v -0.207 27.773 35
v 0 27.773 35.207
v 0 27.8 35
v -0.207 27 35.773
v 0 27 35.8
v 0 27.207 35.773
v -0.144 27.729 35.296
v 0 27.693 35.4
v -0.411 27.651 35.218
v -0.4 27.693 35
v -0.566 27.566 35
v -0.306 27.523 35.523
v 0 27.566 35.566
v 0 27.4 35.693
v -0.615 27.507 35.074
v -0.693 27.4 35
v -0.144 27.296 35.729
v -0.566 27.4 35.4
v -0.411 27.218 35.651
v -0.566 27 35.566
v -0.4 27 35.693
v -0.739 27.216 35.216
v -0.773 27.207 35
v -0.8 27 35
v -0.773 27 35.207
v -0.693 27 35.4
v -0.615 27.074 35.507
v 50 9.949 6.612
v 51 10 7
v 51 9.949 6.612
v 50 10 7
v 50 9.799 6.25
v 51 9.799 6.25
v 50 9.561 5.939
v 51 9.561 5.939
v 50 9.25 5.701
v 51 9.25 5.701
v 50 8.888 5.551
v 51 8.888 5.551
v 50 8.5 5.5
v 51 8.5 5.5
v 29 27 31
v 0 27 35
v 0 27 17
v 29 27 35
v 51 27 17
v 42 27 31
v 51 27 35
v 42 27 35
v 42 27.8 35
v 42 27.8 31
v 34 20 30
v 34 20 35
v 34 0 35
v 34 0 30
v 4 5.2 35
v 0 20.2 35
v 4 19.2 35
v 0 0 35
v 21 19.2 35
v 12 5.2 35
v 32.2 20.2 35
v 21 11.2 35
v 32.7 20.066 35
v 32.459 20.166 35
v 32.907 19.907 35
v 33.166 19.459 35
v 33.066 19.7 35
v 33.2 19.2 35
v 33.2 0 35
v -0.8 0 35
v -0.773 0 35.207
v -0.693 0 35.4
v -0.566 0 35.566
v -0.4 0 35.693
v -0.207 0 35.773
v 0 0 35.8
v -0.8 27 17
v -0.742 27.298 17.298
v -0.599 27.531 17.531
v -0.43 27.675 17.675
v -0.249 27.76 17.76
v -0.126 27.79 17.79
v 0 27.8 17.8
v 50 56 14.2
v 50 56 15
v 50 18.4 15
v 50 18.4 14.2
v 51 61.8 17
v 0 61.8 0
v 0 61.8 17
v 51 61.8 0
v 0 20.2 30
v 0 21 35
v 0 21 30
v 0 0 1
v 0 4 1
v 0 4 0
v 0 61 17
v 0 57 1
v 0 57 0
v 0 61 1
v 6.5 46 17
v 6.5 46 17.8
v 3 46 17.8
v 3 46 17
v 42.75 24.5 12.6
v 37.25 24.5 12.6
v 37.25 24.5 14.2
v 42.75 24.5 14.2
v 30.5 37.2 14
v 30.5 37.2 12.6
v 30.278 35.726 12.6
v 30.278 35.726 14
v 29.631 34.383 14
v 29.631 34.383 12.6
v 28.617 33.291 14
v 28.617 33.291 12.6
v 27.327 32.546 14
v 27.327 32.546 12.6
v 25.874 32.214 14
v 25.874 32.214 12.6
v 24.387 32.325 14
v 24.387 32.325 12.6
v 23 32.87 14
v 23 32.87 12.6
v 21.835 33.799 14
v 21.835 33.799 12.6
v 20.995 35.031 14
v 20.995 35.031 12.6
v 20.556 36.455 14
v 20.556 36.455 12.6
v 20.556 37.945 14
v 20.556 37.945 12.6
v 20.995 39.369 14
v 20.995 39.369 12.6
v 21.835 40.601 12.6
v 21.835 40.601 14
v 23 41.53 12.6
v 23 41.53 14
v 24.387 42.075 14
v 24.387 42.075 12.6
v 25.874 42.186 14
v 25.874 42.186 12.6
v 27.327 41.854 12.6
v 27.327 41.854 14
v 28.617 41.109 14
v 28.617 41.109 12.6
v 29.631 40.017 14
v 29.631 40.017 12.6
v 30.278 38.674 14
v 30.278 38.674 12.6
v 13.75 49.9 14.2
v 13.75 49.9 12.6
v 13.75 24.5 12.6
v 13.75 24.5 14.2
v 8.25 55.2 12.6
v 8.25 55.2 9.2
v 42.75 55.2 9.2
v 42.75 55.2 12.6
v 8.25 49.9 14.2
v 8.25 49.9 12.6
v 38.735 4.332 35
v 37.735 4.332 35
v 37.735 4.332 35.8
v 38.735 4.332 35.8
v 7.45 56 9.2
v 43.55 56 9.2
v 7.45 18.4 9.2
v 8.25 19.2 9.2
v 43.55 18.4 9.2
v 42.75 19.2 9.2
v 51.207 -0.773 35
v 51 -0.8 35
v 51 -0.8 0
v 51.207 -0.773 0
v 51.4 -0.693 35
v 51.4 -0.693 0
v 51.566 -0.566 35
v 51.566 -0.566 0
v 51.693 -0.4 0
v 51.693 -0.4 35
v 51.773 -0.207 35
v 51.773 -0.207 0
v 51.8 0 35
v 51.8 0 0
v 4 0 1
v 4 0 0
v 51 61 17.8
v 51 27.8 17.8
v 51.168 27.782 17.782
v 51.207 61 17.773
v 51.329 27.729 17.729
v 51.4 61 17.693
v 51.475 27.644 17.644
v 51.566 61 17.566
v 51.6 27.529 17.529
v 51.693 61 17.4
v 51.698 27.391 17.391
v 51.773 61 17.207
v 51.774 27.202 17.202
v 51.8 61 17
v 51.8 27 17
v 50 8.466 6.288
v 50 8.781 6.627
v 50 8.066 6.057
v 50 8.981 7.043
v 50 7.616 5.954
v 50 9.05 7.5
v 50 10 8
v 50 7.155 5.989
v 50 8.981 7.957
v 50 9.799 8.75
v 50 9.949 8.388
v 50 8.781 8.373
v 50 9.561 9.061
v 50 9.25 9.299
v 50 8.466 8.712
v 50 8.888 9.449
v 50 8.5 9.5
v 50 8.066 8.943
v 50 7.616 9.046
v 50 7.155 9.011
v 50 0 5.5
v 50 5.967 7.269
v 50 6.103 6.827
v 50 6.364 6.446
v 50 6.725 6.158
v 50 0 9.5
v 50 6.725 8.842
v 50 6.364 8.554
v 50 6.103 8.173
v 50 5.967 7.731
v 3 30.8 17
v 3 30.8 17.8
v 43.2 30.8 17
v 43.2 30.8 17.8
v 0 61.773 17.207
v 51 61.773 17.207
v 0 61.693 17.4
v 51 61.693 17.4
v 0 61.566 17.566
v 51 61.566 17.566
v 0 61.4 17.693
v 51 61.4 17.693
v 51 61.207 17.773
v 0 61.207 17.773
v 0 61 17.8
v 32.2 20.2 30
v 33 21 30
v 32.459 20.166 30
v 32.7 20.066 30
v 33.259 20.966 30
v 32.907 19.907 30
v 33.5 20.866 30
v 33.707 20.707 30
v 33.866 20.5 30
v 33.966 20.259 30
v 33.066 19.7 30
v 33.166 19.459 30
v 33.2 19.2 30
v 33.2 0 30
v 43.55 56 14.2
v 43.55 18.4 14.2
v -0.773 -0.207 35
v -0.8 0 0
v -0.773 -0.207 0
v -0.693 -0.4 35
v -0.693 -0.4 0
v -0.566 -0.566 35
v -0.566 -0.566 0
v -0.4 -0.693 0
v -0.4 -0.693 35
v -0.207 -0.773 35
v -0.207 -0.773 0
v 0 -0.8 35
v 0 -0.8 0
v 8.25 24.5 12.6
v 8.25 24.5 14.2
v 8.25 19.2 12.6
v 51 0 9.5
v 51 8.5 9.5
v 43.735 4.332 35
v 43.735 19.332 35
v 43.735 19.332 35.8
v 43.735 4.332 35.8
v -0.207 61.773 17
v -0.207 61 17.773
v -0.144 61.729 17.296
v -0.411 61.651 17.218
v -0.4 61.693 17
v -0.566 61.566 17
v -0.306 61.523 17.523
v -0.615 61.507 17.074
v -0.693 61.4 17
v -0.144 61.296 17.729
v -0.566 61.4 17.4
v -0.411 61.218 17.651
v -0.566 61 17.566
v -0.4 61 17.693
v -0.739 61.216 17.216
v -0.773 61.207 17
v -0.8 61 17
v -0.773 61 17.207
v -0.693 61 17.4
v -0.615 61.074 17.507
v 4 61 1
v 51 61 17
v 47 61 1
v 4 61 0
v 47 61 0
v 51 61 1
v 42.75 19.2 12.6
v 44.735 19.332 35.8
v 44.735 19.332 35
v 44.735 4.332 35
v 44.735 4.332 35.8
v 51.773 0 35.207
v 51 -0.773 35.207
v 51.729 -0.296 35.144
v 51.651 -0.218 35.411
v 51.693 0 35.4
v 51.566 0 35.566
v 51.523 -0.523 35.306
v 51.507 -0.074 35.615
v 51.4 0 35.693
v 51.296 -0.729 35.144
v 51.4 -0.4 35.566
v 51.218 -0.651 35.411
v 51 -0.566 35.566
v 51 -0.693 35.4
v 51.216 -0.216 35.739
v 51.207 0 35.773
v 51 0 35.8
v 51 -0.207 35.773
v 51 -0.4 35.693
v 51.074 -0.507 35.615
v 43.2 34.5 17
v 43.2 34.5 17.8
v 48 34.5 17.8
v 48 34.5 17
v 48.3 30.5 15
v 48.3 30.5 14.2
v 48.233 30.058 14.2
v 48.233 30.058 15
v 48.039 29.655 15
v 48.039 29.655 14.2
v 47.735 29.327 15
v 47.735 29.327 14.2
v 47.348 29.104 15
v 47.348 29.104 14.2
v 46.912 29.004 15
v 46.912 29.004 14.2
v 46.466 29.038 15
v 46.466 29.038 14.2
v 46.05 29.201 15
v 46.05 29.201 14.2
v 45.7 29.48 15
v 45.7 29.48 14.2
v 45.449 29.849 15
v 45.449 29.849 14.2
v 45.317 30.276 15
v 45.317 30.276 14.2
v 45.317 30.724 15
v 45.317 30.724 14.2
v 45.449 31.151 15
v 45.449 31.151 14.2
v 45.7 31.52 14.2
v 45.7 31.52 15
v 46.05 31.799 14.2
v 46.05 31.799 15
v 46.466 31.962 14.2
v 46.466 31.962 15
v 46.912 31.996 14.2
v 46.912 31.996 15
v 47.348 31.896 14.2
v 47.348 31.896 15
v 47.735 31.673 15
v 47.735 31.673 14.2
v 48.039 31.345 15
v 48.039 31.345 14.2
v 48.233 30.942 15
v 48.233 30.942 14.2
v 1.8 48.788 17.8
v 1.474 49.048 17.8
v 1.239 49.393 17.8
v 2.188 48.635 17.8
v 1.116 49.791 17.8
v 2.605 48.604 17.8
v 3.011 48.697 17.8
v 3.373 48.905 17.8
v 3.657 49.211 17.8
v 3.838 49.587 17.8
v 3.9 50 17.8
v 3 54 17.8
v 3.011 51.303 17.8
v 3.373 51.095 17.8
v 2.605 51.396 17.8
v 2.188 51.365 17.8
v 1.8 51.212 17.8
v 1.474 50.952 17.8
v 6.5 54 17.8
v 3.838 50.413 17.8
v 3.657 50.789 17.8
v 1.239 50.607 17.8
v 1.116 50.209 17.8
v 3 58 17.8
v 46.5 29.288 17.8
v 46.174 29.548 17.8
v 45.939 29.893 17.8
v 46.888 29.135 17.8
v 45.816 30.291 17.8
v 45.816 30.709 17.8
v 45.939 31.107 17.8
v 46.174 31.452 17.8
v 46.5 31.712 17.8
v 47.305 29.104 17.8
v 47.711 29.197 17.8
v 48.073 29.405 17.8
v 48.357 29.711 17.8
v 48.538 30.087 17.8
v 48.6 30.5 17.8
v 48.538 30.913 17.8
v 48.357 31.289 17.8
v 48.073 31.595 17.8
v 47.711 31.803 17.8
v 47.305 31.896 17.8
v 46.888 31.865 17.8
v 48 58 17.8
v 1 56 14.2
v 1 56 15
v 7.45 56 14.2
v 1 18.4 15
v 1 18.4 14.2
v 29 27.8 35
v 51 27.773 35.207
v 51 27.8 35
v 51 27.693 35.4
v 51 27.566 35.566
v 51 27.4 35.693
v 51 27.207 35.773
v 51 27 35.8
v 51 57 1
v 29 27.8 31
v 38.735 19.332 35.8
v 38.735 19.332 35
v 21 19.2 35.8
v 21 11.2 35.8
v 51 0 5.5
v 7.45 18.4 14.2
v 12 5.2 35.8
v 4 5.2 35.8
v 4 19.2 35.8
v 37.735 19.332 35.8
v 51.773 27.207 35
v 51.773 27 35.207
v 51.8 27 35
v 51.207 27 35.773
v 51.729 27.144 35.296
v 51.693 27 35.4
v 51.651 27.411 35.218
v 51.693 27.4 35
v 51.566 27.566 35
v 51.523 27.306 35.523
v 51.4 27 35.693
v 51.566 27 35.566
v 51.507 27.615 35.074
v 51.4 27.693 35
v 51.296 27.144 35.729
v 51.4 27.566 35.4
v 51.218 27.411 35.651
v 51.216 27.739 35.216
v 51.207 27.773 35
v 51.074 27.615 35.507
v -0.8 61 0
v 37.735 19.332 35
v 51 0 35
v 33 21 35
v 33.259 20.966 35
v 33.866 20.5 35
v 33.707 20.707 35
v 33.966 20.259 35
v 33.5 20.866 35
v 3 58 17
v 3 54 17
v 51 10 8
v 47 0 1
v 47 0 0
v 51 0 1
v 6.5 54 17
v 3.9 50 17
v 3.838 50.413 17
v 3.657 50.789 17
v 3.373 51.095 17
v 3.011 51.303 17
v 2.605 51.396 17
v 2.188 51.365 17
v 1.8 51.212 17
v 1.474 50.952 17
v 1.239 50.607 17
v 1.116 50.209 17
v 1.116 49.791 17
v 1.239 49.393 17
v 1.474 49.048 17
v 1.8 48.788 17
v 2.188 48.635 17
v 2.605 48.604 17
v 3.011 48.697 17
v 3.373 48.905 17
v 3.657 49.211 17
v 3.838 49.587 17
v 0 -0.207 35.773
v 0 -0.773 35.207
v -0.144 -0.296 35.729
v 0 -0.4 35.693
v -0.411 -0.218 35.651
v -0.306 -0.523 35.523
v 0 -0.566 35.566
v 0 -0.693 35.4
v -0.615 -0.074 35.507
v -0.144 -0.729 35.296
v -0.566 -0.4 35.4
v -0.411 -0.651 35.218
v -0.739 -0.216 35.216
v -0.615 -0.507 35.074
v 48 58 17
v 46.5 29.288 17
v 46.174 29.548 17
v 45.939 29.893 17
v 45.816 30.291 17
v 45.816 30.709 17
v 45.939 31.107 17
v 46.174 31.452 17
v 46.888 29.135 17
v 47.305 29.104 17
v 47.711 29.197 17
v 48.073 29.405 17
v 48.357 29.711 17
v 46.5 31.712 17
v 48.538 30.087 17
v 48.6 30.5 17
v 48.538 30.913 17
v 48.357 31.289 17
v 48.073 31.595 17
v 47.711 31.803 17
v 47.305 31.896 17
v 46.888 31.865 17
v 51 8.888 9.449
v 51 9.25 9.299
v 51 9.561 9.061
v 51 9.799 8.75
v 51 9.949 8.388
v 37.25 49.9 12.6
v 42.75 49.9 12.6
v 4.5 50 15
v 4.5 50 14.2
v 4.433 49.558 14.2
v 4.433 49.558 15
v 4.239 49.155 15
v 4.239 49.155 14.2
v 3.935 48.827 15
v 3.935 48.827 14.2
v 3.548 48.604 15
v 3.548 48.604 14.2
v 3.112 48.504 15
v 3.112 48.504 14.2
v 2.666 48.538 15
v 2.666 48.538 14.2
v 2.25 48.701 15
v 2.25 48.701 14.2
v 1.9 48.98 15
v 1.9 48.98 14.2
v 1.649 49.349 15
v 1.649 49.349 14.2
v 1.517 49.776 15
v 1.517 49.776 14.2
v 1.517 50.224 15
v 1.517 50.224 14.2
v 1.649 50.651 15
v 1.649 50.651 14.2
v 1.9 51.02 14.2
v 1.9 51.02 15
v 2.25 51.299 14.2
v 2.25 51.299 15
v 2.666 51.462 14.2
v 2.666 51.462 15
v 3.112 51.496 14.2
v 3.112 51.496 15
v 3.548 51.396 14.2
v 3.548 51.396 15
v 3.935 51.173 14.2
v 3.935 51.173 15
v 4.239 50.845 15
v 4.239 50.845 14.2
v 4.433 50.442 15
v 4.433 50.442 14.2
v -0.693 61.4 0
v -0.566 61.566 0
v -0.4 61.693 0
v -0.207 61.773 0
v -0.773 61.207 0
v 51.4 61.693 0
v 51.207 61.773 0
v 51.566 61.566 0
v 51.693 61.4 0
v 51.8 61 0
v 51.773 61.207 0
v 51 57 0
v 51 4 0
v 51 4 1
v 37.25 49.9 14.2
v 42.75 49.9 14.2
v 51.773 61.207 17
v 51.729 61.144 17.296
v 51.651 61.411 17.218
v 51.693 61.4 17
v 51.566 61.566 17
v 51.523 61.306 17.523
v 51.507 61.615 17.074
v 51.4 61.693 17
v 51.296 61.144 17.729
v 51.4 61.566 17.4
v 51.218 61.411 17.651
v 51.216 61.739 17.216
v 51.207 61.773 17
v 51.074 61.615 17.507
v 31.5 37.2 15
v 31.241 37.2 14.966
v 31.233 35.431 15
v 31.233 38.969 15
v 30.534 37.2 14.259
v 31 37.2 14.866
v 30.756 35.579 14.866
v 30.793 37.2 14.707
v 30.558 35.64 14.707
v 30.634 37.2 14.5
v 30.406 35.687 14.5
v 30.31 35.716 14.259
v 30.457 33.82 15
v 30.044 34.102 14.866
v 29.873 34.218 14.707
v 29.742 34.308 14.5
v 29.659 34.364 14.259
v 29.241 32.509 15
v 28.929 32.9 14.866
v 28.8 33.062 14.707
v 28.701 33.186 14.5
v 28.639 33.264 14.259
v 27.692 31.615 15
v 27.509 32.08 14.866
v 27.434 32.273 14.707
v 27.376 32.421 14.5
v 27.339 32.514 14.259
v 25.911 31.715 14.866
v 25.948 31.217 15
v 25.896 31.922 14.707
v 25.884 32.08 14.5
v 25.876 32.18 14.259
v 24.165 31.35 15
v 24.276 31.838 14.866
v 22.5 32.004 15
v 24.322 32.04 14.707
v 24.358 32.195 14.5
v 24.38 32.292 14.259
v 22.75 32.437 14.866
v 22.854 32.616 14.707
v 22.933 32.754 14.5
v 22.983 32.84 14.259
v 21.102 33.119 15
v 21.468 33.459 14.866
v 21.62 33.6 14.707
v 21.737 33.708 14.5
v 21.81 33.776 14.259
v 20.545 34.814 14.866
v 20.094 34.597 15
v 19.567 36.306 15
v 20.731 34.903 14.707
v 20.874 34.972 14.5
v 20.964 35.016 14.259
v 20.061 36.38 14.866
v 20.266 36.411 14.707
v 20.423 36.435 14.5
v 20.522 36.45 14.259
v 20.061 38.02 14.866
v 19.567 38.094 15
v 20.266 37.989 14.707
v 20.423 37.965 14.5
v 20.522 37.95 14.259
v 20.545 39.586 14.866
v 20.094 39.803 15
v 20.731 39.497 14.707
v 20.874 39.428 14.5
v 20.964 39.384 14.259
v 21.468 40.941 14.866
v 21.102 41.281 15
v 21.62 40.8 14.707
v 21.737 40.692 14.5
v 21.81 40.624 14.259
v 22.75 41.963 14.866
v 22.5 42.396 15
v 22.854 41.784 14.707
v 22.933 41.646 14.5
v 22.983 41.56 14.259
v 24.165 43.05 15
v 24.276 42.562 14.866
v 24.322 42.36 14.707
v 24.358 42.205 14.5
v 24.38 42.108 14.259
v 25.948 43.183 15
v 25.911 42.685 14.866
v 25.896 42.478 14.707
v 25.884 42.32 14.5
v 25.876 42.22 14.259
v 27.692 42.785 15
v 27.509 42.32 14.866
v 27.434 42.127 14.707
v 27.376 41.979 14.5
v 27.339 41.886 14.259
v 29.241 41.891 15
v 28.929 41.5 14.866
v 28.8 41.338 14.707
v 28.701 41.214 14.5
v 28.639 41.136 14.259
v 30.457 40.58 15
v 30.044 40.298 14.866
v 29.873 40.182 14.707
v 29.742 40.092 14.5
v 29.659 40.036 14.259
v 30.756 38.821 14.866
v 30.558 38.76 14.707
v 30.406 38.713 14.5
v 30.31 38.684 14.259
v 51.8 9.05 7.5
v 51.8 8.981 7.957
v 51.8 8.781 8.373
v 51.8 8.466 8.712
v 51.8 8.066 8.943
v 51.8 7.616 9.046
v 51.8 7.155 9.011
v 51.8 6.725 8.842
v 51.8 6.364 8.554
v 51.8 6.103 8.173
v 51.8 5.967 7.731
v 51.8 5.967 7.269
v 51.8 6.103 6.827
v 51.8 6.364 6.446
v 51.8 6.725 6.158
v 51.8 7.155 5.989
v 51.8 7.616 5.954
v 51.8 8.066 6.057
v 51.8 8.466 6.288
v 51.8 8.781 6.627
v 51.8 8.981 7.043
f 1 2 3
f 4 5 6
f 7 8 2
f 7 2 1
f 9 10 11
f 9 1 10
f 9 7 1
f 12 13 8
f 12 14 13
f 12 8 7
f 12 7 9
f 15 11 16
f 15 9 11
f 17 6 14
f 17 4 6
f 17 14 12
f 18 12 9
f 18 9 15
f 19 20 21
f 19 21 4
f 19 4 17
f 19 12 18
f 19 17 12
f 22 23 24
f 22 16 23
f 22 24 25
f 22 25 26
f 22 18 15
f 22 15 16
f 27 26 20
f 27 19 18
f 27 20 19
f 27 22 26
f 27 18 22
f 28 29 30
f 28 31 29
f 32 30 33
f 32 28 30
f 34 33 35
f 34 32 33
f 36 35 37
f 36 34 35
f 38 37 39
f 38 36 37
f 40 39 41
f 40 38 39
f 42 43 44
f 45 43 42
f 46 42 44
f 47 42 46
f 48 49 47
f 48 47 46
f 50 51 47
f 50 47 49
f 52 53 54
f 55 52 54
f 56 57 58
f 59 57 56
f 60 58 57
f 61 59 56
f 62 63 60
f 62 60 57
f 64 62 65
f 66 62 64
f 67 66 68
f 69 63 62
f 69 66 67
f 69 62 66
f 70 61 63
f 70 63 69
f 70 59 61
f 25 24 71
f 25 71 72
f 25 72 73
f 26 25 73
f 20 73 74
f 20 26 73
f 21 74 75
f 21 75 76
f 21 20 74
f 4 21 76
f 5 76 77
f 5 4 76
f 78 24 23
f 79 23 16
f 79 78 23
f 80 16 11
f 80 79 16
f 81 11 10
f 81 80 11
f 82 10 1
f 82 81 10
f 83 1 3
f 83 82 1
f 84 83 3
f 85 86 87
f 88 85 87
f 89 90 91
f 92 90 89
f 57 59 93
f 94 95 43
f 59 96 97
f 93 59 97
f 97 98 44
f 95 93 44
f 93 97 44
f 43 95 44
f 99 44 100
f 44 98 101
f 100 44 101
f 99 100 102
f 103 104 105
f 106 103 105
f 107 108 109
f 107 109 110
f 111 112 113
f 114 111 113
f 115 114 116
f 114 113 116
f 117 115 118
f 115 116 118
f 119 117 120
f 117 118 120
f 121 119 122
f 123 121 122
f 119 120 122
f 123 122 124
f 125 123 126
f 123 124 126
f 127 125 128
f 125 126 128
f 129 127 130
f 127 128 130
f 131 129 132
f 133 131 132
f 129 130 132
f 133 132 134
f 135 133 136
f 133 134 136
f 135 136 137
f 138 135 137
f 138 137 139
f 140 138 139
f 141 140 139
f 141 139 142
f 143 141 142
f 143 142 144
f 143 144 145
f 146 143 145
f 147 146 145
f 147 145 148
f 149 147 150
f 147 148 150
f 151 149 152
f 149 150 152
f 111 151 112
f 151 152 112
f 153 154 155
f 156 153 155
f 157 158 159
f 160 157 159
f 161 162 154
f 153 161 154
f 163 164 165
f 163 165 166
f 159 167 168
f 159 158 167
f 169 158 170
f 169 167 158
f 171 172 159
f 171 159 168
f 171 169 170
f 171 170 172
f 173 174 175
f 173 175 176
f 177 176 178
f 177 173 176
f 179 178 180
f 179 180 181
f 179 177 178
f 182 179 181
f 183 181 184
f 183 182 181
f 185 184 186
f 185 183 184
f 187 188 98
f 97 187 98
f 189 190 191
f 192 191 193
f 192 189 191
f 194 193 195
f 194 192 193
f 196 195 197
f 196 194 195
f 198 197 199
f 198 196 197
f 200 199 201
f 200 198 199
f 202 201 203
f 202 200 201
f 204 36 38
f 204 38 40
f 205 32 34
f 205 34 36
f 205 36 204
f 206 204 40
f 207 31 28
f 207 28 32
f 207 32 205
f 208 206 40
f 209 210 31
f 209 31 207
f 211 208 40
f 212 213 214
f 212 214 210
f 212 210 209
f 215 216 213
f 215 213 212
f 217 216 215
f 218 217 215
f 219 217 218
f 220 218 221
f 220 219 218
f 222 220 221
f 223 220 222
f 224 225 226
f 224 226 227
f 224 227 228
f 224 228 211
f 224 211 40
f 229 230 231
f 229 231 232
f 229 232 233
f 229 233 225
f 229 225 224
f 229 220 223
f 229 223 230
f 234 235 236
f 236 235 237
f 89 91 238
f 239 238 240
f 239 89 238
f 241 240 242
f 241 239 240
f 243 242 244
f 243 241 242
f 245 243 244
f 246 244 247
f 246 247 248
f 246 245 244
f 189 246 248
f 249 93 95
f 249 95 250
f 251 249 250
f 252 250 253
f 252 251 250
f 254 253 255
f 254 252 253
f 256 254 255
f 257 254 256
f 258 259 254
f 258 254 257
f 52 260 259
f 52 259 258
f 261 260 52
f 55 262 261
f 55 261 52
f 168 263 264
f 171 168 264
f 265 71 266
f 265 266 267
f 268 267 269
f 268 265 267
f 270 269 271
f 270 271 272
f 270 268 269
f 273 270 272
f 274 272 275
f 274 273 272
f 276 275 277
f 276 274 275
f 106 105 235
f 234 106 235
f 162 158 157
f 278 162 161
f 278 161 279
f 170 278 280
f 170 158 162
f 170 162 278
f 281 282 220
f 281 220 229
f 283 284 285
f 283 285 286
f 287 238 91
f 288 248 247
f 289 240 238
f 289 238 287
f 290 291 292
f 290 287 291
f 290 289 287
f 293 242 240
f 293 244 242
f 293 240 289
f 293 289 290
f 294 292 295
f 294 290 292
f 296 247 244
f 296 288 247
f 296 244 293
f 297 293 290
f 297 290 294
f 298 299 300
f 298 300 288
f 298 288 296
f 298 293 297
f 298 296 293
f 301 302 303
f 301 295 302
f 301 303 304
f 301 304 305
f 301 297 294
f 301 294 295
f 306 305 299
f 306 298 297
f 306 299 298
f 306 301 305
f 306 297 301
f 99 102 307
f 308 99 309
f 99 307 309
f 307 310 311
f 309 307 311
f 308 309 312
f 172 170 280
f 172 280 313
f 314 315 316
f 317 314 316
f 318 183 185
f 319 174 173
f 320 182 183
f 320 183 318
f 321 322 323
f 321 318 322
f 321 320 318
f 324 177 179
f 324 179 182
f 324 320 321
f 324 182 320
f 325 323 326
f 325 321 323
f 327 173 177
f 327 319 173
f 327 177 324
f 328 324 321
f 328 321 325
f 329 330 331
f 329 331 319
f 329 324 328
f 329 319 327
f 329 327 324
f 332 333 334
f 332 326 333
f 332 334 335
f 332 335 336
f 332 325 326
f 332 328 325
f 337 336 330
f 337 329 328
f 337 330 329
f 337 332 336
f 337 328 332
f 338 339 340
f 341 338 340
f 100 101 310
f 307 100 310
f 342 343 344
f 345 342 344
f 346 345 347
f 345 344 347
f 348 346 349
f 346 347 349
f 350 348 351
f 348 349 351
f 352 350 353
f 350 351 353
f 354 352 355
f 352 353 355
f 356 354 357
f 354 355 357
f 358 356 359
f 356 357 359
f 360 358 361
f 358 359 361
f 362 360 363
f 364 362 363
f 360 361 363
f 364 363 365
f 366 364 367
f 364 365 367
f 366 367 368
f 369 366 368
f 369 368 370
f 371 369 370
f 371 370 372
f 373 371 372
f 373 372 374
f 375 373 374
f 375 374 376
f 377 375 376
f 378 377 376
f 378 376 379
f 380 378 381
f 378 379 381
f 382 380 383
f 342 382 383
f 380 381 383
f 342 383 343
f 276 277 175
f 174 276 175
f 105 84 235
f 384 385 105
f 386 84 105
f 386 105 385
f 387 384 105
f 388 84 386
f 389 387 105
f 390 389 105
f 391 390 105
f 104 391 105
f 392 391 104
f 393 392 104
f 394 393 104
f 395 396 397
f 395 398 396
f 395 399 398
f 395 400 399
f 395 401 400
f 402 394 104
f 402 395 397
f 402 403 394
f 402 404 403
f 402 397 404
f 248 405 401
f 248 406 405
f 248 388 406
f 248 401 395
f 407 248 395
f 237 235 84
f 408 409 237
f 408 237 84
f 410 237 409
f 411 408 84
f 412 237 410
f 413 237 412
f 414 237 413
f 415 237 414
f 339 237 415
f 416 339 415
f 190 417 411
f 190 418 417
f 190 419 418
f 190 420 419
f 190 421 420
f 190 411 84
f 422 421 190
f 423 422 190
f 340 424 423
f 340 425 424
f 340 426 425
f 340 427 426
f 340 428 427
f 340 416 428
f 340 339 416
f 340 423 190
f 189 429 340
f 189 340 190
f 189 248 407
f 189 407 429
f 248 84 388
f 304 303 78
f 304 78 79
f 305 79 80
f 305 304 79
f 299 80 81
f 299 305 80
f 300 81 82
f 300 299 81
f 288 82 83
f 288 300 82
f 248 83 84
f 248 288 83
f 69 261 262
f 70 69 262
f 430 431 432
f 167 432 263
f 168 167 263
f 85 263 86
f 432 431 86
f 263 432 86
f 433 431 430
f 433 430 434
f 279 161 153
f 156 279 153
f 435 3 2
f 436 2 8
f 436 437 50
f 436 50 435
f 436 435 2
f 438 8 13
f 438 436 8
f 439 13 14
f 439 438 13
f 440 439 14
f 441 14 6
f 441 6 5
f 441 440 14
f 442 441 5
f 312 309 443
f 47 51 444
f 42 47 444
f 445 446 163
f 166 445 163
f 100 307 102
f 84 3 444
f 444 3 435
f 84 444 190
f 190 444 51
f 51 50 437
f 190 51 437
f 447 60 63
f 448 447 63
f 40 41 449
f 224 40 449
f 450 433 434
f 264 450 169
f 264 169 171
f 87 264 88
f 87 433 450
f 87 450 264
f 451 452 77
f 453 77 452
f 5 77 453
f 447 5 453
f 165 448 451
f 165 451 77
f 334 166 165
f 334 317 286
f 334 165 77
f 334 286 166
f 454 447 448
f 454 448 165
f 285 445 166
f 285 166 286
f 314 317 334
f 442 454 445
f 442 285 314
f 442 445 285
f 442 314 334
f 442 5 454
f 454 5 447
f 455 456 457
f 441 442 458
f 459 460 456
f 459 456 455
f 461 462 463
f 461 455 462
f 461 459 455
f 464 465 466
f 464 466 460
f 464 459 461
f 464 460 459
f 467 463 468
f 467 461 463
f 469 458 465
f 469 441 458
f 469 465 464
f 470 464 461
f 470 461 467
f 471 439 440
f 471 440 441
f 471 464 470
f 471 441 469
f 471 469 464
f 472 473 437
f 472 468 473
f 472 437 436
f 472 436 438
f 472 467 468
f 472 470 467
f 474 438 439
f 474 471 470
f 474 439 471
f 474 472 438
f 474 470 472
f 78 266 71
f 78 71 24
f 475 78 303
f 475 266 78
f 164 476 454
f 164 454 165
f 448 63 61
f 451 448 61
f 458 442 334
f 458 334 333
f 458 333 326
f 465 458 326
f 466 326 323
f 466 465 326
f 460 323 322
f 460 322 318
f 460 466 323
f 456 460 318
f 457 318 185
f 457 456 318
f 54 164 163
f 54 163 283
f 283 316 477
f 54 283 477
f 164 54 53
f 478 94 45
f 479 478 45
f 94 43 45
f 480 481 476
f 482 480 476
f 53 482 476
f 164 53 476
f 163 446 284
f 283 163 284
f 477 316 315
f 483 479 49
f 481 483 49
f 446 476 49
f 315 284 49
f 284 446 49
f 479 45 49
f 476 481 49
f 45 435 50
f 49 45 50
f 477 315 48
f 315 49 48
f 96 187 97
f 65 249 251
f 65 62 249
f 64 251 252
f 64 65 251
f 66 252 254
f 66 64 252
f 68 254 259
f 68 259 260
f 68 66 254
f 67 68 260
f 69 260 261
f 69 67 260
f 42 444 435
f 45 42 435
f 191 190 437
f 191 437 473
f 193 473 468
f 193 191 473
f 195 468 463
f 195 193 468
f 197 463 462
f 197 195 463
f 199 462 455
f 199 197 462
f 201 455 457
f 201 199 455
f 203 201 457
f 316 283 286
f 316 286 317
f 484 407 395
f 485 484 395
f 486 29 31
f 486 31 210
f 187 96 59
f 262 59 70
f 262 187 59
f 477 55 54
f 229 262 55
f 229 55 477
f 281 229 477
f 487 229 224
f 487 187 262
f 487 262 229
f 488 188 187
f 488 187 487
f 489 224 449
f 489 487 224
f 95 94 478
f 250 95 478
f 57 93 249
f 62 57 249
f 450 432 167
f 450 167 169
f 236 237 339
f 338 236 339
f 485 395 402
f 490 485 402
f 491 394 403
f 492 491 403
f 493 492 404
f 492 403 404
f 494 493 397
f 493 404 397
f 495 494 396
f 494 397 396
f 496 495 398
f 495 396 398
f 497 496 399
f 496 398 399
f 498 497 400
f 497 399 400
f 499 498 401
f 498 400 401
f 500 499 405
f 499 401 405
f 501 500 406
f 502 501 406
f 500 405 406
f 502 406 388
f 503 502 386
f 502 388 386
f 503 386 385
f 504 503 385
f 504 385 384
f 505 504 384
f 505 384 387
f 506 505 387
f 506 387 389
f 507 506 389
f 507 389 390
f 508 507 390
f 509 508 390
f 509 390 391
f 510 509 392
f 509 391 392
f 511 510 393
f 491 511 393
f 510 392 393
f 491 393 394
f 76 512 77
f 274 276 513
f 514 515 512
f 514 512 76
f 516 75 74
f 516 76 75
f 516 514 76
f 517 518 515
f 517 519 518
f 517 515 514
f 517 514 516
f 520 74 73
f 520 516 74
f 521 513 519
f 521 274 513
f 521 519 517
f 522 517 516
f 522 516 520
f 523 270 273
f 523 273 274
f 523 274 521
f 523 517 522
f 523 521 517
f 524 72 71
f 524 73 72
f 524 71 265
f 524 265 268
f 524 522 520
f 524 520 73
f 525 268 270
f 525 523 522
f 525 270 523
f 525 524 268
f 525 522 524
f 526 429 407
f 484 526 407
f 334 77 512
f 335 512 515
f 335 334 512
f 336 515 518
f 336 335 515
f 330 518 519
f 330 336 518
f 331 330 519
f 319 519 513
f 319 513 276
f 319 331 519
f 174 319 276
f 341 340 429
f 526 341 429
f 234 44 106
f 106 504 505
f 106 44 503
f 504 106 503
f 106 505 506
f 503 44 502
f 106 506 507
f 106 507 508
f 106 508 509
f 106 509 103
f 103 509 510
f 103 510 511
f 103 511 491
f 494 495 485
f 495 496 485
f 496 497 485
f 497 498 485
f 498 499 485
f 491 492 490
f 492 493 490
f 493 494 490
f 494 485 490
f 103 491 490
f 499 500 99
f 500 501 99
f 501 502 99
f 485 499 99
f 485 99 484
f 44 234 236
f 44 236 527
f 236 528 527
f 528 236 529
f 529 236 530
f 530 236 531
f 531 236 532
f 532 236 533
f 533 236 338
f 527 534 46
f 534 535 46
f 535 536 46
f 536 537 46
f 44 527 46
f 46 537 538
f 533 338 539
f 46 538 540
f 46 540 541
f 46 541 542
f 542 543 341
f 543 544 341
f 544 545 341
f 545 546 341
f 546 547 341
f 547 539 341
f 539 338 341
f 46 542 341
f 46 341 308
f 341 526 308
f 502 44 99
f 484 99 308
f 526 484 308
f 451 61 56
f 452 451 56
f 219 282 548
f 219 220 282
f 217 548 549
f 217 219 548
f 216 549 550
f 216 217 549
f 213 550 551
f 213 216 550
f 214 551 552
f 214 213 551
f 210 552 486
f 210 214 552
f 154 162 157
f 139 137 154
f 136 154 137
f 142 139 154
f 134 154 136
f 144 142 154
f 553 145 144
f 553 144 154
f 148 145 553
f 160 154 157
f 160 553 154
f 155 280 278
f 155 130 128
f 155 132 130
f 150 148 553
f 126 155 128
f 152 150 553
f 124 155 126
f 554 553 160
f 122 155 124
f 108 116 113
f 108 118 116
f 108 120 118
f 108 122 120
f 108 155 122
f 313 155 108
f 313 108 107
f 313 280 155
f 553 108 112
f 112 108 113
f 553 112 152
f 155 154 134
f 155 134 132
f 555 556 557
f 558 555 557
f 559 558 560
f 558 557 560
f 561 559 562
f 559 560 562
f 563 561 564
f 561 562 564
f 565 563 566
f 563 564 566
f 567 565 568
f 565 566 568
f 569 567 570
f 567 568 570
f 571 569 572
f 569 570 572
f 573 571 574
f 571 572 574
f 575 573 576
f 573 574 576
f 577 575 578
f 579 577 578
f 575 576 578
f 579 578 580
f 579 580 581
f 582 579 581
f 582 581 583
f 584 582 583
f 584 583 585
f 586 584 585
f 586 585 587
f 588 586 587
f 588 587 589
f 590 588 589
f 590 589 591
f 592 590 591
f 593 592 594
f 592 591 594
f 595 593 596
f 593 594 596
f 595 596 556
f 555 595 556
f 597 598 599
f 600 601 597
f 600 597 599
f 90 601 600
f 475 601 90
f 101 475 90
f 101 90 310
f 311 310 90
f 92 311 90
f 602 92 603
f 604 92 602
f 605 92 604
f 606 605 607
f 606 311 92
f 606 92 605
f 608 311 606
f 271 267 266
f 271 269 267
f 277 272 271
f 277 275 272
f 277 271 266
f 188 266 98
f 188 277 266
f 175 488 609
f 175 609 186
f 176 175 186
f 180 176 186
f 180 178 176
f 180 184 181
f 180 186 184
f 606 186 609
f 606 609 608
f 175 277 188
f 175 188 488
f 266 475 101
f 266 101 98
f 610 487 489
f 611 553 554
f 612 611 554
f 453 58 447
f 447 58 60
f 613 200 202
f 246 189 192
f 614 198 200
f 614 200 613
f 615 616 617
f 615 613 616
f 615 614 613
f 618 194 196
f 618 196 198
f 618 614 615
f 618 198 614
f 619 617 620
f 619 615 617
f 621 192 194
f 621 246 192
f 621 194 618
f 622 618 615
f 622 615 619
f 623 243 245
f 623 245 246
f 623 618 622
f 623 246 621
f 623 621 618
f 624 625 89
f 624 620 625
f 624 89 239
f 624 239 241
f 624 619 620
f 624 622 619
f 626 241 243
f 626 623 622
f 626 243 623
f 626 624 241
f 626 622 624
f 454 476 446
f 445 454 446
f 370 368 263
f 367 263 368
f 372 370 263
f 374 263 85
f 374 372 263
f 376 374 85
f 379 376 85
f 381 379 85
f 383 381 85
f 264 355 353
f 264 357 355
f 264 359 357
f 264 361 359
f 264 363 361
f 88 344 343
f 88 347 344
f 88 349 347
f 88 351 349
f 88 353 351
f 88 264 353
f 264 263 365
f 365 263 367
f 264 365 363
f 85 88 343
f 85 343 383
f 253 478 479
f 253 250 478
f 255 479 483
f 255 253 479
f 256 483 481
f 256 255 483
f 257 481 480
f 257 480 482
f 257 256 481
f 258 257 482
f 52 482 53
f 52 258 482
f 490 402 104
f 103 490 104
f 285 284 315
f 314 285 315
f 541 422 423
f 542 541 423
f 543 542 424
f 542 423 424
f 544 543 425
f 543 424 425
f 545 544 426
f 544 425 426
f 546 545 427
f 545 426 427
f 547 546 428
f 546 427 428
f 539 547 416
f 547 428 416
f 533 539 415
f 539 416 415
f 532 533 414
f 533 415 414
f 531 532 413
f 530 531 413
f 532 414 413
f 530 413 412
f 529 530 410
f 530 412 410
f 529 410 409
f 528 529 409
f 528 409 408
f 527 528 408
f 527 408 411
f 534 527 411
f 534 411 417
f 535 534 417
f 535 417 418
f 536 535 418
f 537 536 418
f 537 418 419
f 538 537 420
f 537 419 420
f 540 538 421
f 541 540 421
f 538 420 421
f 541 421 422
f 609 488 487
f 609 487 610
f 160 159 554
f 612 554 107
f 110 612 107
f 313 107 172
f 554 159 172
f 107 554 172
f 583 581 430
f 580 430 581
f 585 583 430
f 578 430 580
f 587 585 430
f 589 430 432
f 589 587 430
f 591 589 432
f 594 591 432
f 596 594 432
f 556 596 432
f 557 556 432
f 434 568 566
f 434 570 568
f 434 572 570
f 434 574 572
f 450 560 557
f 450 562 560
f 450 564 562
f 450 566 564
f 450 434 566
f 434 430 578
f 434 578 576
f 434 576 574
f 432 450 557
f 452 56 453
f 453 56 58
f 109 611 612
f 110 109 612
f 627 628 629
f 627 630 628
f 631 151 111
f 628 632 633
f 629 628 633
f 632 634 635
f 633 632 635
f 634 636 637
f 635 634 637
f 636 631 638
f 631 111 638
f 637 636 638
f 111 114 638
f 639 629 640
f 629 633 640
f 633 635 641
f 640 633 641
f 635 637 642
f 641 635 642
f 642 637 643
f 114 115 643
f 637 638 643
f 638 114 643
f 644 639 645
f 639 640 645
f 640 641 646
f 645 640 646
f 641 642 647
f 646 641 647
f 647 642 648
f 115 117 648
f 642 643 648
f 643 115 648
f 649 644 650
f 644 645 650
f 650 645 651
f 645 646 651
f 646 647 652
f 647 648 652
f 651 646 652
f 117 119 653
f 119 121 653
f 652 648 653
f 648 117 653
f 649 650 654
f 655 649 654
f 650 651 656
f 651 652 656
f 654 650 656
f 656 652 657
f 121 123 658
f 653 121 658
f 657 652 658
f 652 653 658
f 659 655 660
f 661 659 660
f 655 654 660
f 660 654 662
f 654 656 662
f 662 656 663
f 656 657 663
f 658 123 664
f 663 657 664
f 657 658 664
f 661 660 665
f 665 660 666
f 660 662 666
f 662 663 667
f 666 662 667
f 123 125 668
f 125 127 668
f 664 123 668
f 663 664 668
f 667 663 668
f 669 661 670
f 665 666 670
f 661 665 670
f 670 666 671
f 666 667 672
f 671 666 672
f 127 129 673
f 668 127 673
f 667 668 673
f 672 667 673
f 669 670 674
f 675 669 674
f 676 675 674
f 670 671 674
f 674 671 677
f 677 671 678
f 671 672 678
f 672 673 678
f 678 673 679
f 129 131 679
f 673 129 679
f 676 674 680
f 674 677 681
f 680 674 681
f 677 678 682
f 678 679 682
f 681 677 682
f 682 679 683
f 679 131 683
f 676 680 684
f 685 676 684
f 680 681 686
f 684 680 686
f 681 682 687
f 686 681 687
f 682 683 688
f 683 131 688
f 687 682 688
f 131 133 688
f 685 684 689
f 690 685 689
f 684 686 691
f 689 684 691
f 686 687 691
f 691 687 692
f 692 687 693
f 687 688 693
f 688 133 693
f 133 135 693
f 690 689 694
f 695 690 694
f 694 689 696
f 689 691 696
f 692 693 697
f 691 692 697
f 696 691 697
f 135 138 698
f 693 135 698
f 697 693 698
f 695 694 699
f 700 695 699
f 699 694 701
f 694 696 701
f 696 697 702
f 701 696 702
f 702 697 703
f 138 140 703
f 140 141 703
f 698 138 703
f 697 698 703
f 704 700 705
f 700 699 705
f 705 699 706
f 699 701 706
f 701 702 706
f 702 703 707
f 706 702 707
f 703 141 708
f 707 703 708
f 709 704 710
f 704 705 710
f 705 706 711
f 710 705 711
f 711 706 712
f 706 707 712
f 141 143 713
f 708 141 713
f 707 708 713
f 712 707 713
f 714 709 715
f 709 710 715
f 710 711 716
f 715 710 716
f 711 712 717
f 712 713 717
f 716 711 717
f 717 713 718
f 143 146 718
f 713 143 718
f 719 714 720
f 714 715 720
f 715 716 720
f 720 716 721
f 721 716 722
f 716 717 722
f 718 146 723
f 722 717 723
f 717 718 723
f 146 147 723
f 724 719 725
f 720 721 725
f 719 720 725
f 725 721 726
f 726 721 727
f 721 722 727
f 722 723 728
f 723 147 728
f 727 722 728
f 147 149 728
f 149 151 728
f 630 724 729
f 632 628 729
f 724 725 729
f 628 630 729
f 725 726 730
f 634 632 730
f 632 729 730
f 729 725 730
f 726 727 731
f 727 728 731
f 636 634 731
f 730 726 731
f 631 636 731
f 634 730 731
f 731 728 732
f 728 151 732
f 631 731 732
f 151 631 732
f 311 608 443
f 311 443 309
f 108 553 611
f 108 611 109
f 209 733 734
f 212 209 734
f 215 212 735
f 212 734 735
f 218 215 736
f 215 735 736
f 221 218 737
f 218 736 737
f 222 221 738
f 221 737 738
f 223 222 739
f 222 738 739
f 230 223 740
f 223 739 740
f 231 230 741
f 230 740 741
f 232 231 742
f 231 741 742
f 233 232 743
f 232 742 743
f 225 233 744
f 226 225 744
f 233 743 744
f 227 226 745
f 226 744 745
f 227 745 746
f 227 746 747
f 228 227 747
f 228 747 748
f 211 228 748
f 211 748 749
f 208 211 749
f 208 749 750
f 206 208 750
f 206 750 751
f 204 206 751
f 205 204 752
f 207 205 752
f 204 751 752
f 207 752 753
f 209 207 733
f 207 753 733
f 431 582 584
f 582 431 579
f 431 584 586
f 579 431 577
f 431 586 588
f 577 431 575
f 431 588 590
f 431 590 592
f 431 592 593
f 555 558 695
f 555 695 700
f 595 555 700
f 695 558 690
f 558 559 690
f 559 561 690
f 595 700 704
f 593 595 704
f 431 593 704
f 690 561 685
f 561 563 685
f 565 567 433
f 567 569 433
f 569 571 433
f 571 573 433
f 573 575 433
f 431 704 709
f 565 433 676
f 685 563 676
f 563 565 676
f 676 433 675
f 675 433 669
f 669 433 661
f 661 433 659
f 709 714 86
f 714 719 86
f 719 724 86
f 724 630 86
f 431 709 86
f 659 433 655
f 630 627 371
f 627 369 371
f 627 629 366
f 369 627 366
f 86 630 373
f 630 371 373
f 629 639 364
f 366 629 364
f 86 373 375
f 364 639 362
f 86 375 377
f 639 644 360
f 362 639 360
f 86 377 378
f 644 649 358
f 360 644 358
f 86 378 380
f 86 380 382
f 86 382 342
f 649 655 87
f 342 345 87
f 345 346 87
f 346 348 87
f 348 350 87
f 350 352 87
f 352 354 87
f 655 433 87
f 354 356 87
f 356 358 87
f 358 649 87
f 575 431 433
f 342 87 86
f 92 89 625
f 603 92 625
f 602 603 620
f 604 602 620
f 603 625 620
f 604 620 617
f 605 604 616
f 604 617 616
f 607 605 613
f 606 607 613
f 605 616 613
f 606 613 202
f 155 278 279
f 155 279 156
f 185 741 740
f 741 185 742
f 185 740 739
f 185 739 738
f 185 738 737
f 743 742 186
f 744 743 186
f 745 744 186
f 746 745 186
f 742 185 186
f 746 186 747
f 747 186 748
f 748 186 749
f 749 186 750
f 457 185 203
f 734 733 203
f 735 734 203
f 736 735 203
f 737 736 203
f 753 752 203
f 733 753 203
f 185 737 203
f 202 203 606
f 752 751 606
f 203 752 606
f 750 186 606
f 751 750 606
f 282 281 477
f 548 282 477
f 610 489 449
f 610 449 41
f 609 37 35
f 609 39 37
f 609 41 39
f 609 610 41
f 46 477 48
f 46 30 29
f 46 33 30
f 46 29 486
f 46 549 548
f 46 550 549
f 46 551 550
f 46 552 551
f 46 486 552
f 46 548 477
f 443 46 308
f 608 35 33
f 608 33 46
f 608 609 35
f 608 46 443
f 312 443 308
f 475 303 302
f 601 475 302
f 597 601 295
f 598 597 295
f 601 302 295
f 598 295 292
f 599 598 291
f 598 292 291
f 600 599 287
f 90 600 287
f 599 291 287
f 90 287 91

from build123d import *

# Parameters (mm, degrees)
SKETCH_W                = 51
SKETCH_H                = 61
PAD_DEPTH               = 35
SKETCH001_W             = 51
SKETCH001_H             = 34
POCKET_DEPTH            = 18
THICKNESS_T             = 0.8
SKETCH002_W             = 13
SKETCH002_H             = 4
POCKET001_DEPTH         = 0.8
SKETCH003_R             = 1.4
POCKET002_DEPTH         = 0.8
SKETCH004_R             = 1.4
POCKET003_DEPTH         = 0.8
POCKET004_DEPTH         = 0.8
SKETCH006_W             = 34
SKETCH006_H             = 21
PAD001_DEPTH            = 5
SKETCH007_W             = 33.2
SKETCH007_H             = 20.2
POCKET005_DEPTH         = 5
POCKET006_DEPTH         = 0.8
SKETCH010_W             = 1
SKETCH010_H             = 15
POCKET007_DEPTH         = 0.8
LINEARPATTERN_COUNT     = 2
LINEARPATTERN_PITCH     = 6
FILLET_R                = 1
PAD002_DEPTH            = 1
PAD003_DEPTH            = 1
PAD004_DEPTH            = 1
PAD005_DEPTH            = 1
SKETCH016_W             = 10
SKETCH016_H             = 4
PAD006_DEPTH            = 1
SKETCH015_R             = 1.55
POCKET008_DEPTH         = 1.8
FILLET001_R             = 1.5
SKETCH017_W             = 49
SKETCH017_H             = 37.6
PAD007_DEPTH            = 0.8
SKETCH018_R             = 1.5
POCKET009_DEPTH         = 0.8
SKETCH020_R             = 1.5
POCKET010_DEPTH         = 0.8
SKETCH021_W             = 36.1
SKETCH021_H             = 37.6
PAD008_DEPTH            = 5
SKETCH022_W             = 34.5
SKETCH022_H             = 36
POCKET011_DEPTH         = 3.4
SKETCH023_W             = 5.5
SKETCH023_H             = 25.4
POCKET012_DEPTH         = 1.6
SKETCH024_W             = 5.5
SKETCH024_H             = 25.4
POCKET013_DEPTH         = 1.6
SKETCH025_R             = 5
POCKET014_DEPTH         = 2.4
FILLET002_R             = 1
BODY001_PLACEMENT_ANGLE = 180


with BuildPart() as body:
    # Sketch → Pad (new body)
    with BuildSketch(Plane.XY):
        with Locations((25.5, 30.5)):
            Rectangle(SKETCH_W, SKETCH_H)
    extrude(amount=PAD_DEPTH)

    # Sketch001 (on Face6 of Pad) → Pocket (cut)
    with BuildSketch(Plane.XY.offset(35)):
        with Locations((25.5, 44)):
            Rectangle(SKETCH001_W, SKETCH001_H)
    extrude(amount=-POCKET_DEPTH, mode=Mode.SUBTRACT)

    # Thickness
    thickness_openings = [body.faces().sort_by_distance(p)[0] for p in [
        (25.5, 30.5, 0),
    ]]
    offset(amount=THICKNESS_T, openings=thickness_openings)

    # Sketch002 (on Face31 of Thickness) → Pocket001 (cut)
    with BuildSketch(Plane(origin=(0, 27.8, 0), x_dir=(-1, 0, 0), z_dir=(0, 1, 0))):
        with Locations((-35.5, 33)):
            Rectangle(SKETCH002_W, SKETCH002_H)
    extrude(amount=-POCKET001_DEPTH, mode=Mode.SUBTRACT)

    # Sketch003 (on Face35 of Pocket001) → Pocket002 (cut)
    with BuildSketch(Plane.XY.offset(17.8)):
        with Locations((2.5, 50)):
            Circle(SKETCH003_R)
    extrude(amount=-POCKET002_DEPTH, mode=Mode.SUBTRACT)

    # Sketch004 (on Face36 of Pocket002) → Pocket003 (cut)
    with BuildSketch(Plane.XY.offset(17.8)):
        with Locations((47.2, 30.5)):
            Circle(SKETCH004_R)
    extrude(amount=-POCKET003_DEPTH, mode=Mode.SUBTRACT)

    # Sketch005 (on Face37 of Pocket003) → Pocket004 (cut)
    with BuildSketch(Plane.XY.offset(17.8)):
        Polygon((3, 46), (3, 30.8), (43.2, 30.8), (43.2, 34.5), (48, 34.5), (48, 58), (3, 58), (3, 54), (6.5, 54), (6.5, 46), align=None)
    extrude(amount=-POCKET004_DEPTH, mode=Mode.SUBTRACT)

    # Sketch006 (on Face5 of Pocket004) → Pad001 (join)
    with BuildSketch(Plane(origin=(0, 0, 35), x_dir=(1, 0, 0), z_dir=(0, 0, -1))):
        with Locations((17, -10.5)):
            Rectangle(SKETCH006_W, SKETCH006_H)
    extrude(amount=PAD001_DEPTH)

    # Sketch007 (on Face6 of Pad001) → Pocket005 (cut)
    with BuildSketch(Plane(origin=(0, 0, 30), x_dir=(1, 0, 0), z_dir=(0, 0, -1))):
        with Locations((16.6, -10.1)):
            Rectangle(SKETCH007_W, SKETCH007_H)
    extrude(amount=-POCKET005_DEPTH, mode=Mode.SUBTRACT)

    # Sketch008 (on Face24 of Pocket005) → Pocket006 (cut)
    with BuildSketch(Plane(origin=(0, 0, 35), x_dir=(1, 0, 0), z_dir=(0, 0, -1))):
        Polygon((4, -19.2), (21, -19.2), (21, -11.2), (12, -5.2), (4, -5.2), align=None)
    extrude(amount=-POCKET006_DEPTH, mode=Mode.SUBTRACT)

    # Sketch010 (on Face4 of Pocket006) → Pocket007 (cut)
    with BuildSketch(Plane(origin=(0, 0, 35), x_dir=(1, 0, 0), z_dir=(0, 0, -1))):
        with Locations((38.234802, -11.832042)):
            Rectangle(SKETCH010_W, SKETCH010_H)
    pocket007 = extrude(amount=-POCKET007_DEPTH, mode=Mode.SUBTRACT)

    # LinearPattern: Pocket007 ×2
    with Locations(*[(i * LINEARPATTERN_PITCH, 0, 0) for i in range(1, LINEARPATTERN_COUNT)]):
        add(pocket007, mode=Mode.SUBTRACT)

    # Fillet
    fillet_edges = [body.edges().sort_by_distance(p)[0] for p in [
        (33.2, 20.2, 32.5),
        (34, 21, 32.5),
    ]]
    fillet(fillet_edges, radius=FILLET_R)

    # Sketch011 (on Face19 of Fillet) → Pad002 (join)
    with BuildSketch(Plane(origin=(0, 0, 0), x_dir=(1, 0, 0), z_dir=(0, 0, -1))):
        Polygon((0, 0), (4, 0), (0, -4), align=None)
    extrude(amount=-PAD002_DEPTH)

    # Sketch012 (on Face19 of Pad002) → Pad003 (join)
    with BuildSketch(Plane(origin=(0, 0, 0), x_dir=(1, 0, 0), z_dir=(0, 0, -1))):
        Polygon((51, 0), (47, 0), (51, -4), align=None)
    extrude(amount=-PAD003_DEPTH)

    # Sketch013 (on Face19 of Pad003) → Pad004 (join)
    with BuildSketch(Plane(origin=(0, 0, 0), x_dir=(1, 0, 0), z_dir=(0, 0, -1))):
        Polygon((0, -61), (0, -57), (4, -61), align=None)
    extrude(amount=-PAD004_DEPTH)

    # Sketch014 (on Face19 of Pad004) → Pad005 (join)
    with BuildSketch(Plane(origin=(0, 0, 0), x_dir=(1, 0, 0), z_dir=(0, 0, -1))):
        Polygon((51, -61), (51, -57), (47, -61), align=None)
    extrude(amount=-PAD005_DEPTH)

    # Sketch016 (on Face9 of Pad005) → Pad006 (join)
    with BuildSketch(Plane(origin=(51, 0, 0), x_dir=(0, -1, 0), z_dir=(-1, 0, 0))):
        with Locations((-5, 7.5)):
            Rectangle(SKETCH016_W, SKETCH016_H)
    extrude(amount=PAD006_DEPTH)

    # Sketch015 (on Face49 of Pad005) → Pocket008 (cut)
    with BuildSketch(Plane.YZ.offset(51.8)):
        with Locations((7.5, 7.5)):
            Circle(SKETCH015_R)
    extrude(amount=-POCKET008_DEPTH, mode=Mode.SUBTRACT)

    # Fillet001
    fillet001_edges = [body.edges().sort_by_distance(p)[0] for p in [
        (50.5, 10, 5.5),
        (50.5, 10, 9.5),
    ]]
    fillet(fillet001_edges, radius=FILLET001_R)


with BuildPart() as esp:
    # Sketch017 → Pad007 (new body)
    with BuildSketch(Plane.XY):
        with Locations((24.5, 18.8)):
            Rectangle(SKETCH017_W, SKETCH017_H)
    extrude(amount=PAD007_DEPTH)

    # Sketch018 (on Face6 of Pad007) → Pocket009 (cut)
    with BuildSketch(Plane.XY.offset(0.8)):
        with Locations((2, 6)):
            Circle(SKETCH018_R)
    extrude(amount=-POCKET009_DEPTH, mode=Mode.SUBTRACT)

    # Sketch020 (on Face5 of Pocket009) → Pocket010 (cut)
    with BuildSketch(Plane.XY.offset(0.8)):
        with Locations((45.8, 25.5)):
            Circle(SKETCH020_R)
    extrude(amount=-POCKET010_DEPTH, mode=Mode.SUBTRACT)

    # Sketch021 (on Face5 of Pocket010) → Pad008 (join)
    with BuildSketch(Plane.XY.offset(0.8)):
        with Locations((24.5, 18.8)):
            Rectangle(SKETCH021_W, SKETCH021_H)
    extrude(amount=PAD008_DEPTH)

    # Sketch022 (on Face13 of Pad008) → Pocket011 (cut)
    with BuildSketch(Plane.XY.offset(5.8)):
        with Locations((24.5, 18.8)):
            Rectangle(SKETCH022_W, SKETCH022_H)
    extrude(amount=-POCKET011_DEPTH, mode=Mode.SUBTRACT)

    # Sketch023 (on Face19 of Pocket011) → Pocket012 (cut)
    with BuildSketch(Plane.XY.offset(2.4)):
        with Locations((10, 18.8)):
            Rectangle(SKETCH023_W, SKETCH023_H)
    extrude(amount=-POCKET012_DEPTH, mode=Mode.SUBTRACT)

    # Sketch024 (on Face19 of Pocket012) → Pocket013 (cut)
    with BuildSketch(Plane.XY.offset(2.4)):
        with Locations((39, 18.8)):
            Rectangle(SKETCH024_W, SKETCH024_H)
    extrude(amount=-POCKET013_DEPTH, mode=Mode.SUBTRACT)

    # Sketch025 (on Face19 of Pocket013) → Pocket014 (cut)
    with BuildSketch(Plane.XY.offset(2.4)):
        with Locations((24.5, 18.8)):
            Circle(SKETCH025_R)
    extrude(amount=-POCKET014_DEPTH, mode=Mode.SUBTRACT)

    # Fillet002
    fillet002_edges = [esp.edges().sort_by_distance(p)[0] for p in [
        (19.5, 18.8, 0),
    ]]
    fillet(fillet002_edges, radius=FILLET002_R)


with BuildPart() as esp_1:
    # Body001 placement: moved
    add(esp.part.moved(Location((1, 56, 15))).rotate(Axis((1, 56, 15), (1, 0, 0)), BODY001_PLACEMENT_ANGLE))


solid = Compound([body.part, esp_1.part])
